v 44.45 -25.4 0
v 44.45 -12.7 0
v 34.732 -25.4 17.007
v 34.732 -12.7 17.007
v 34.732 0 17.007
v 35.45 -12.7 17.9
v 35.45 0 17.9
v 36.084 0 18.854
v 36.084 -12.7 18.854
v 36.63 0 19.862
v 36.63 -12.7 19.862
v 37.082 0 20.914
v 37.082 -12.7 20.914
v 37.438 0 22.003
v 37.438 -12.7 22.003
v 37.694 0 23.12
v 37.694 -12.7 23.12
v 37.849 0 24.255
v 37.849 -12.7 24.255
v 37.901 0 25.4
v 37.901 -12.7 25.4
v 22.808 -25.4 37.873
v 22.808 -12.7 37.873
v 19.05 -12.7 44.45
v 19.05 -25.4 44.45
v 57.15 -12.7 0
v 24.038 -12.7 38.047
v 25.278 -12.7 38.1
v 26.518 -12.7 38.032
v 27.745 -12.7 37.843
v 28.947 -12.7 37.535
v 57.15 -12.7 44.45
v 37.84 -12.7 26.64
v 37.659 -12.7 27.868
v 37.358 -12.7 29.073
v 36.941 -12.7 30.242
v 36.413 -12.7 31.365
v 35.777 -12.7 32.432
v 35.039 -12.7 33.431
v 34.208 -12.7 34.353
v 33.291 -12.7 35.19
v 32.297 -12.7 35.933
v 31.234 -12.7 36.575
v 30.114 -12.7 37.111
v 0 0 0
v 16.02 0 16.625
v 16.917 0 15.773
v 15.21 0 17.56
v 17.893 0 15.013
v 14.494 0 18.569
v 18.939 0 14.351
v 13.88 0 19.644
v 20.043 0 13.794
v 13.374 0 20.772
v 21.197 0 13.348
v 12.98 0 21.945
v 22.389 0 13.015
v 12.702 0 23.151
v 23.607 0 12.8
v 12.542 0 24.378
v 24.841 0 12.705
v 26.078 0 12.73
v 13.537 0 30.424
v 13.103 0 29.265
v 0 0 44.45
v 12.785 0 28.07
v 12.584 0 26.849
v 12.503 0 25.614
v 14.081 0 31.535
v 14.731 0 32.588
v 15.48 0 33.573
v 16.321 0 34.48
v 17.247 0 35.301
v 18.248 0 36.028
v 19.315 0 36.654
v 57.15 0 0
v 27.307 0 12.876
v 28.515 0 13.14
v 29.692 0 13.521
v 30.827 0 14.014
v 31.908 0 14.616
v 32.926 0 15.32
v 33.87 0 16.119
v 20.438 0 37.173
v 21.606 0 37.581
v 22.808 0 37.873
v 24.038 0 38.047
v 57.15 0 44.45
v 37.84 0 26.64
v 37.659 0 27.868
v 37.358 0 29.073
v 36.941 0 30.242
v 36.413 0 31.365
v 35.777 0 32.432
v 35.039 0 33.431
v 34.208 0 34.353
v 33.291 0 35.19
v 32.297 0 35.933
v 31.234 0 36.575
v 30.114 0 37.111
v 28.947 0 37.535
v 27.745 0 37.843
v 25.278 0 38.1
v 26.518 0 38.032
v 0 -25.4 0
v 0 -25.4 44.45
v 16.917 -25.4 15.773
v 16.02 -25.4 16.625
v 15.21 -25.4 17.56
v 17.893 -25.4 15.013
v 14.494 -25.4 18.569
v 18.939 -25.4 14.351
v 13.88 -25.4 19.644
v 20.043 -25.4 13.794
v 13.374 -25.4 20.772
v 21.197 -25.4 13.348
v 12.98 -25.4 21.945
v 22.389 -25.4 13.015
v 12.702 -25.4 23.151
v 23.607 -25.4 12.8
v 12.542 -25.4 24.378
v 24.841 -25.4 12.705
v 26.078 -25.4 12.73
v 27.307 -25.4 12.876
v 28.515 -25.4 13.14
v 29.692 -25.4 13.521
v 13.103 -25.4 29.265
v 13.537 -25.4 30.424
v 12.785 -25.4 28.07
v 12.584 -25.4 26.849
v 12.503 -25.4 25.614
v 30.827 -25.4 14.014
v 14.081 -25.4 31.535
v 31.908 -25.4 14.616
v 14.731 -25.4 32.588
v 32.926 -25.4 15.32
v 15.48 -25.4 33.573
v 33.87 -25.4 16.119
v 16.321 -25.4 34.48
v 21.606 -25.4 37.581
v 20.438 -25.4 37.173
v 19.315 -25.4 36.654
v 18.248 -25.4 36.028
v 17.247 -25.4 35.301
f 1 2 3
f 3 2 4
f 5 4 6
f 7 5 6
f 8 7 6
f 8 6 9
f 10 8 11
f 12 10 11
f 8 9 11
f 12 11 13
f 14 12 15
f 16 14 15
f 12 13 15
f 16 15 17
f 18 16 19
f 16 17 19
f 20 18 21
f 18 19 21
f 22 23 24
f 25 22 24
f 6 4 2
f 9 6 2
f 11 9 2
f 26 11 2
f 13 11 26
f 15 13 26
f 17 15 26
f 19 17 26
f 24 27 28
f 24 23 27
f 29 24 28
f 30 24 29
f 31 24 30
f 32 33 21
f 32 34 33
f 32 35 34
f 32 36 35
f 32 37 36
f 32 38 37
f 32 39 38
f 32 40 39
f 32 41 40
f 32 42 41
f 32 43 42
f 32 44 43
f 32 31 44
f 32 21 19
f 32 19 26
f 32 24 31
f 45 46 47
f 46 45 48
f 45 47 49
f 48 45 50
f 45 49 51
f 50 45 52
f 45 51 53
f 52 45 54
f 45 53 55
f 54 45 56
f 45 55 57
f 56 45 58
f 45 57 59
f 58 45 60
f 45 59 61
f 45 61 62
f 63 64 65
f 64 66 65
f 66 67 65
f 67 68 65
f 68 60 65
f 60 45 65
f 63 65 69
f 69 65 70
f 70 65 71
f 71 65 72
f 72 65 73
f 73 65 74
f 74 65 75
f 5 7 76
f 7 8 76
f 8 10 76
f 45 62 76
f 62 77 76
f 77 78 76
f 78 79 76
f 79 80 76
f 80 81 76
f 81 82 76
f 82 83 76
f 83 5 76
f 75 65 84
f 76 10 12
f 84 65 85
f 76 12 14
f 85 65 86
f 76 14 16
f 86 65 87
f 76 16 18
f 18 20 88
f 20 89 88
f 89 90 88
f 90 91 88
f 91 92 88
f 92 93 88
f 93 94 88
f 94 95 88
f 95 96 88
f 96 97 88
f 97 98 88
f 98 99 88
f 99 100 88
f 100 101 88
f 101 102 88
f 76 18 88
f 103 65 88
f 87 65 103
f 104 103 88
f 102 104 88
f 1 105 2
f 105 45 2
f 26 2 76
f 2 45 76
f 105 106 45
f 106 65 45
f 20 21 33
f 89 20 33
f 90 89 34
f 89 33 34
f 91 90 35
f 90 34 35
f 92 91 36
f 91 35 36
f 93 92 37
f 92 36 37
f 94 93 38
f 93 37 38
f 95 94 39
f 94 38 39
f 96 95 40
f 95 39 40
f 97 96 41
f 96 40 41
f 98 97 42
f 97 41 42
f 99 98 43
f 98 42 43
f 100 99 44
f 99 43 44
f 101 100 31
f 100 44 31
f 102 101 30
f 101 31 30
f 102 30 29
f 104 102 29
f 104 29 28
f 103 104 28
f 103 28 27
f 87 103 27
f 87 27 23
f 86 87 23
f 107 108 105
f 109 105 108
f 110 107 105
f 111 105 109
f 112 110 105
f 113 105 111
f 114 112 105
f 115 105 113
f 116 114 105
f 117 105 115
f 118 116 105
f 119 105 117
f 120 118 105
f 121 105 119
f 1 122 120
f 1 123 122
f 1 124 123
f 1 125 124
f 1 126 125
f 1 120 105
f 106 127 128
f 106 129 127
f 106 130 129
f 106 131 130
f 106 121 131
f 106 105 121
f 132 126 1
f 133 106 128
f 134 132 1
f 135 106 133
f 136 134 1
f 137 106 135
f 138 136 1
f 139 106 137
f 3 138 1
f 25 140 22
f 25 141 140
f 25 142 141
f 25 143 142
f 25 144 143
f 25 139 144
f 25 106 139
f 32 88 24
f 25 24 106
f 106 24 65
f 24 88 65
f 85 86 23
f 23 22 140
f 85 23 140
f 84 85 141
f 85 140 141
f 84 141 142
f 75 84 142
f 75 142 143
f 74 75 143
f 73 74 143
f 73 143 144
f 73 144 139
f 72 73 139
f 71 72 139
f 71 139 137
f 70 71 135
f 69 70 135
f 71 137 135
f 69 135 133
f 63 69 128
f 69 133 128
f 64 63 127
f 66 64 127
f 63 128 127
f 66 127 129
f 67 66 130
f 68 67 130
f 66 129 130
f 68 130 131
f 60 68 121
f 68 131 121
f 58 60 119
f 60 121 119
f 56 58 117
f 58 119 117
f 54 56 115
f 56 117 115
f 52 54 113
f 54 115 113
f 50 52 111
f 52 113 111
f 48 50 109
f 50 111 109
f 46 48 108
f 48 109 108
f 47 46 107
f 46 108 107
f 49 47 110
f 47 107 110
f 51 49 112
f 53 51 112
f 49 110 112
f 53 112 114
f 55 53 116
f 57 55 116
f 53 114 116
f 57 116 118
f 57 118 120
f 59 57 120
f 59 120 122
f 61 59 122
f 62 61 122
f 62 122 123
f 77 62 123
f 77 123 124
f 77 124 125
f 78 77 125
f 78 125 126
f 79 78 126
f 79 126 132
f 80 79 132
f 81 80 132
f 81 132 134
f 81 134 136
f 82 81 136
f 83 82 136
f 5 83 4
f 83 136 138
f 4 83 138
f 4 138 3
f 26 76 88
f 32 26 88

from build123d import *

# Parameters (mm, degrees)
F0_W     = 57.15
F0_H     = 44.45
F1_DEPTH = 12.7
F3_DEPTH = 12.7
F5_DEPTH = 25.4


with BuildPart() as f1:
    # F0 (on Front) → F1 (new body)
    with BuildSketch(Plane.XZ):
        with Locations((28.575, 22.225)):
            Rectangle(F0_W, F0_H)
    extrude(amount=F1_DEPTH)

    # F2 (on face) → F3 (join)
    with BuildSketch(Plane.XZ.offset(12.7)):
        Polygon((19.05, 44.45), (0, 44.45), (0, 0), (44.45, 0), align=None)
    extrude(amount=F3_DEPTH)

    # F4 (on face) → F5 (cut)
    with BuildSketch(Plane.XZ.offset(25.4)):
        with BuildLine():
            ThreePointArc((34.731897, 17.00668), (37.082178, 20.914199), (37.900781, 25.4))
            ThreePointArc((37.900781, 25.4), (33.291142, 35.18959), (22.808487, 37.872647))
            Line((22.808487, 37.872647), (34.731897, 17.00668))
        make_face()
        with BuildLine():
            Line((34.731897, 17.00668), (22.808487, 37.872647))
            ThreePointArc((22.808487, 37.872647), (14.174093, 19.099035), (34.731897, 17.00668))
        make_face()
    extrude(amount=-F5_DEPTH, mode=Mode.SUBTRACT)


solid = f1.part
